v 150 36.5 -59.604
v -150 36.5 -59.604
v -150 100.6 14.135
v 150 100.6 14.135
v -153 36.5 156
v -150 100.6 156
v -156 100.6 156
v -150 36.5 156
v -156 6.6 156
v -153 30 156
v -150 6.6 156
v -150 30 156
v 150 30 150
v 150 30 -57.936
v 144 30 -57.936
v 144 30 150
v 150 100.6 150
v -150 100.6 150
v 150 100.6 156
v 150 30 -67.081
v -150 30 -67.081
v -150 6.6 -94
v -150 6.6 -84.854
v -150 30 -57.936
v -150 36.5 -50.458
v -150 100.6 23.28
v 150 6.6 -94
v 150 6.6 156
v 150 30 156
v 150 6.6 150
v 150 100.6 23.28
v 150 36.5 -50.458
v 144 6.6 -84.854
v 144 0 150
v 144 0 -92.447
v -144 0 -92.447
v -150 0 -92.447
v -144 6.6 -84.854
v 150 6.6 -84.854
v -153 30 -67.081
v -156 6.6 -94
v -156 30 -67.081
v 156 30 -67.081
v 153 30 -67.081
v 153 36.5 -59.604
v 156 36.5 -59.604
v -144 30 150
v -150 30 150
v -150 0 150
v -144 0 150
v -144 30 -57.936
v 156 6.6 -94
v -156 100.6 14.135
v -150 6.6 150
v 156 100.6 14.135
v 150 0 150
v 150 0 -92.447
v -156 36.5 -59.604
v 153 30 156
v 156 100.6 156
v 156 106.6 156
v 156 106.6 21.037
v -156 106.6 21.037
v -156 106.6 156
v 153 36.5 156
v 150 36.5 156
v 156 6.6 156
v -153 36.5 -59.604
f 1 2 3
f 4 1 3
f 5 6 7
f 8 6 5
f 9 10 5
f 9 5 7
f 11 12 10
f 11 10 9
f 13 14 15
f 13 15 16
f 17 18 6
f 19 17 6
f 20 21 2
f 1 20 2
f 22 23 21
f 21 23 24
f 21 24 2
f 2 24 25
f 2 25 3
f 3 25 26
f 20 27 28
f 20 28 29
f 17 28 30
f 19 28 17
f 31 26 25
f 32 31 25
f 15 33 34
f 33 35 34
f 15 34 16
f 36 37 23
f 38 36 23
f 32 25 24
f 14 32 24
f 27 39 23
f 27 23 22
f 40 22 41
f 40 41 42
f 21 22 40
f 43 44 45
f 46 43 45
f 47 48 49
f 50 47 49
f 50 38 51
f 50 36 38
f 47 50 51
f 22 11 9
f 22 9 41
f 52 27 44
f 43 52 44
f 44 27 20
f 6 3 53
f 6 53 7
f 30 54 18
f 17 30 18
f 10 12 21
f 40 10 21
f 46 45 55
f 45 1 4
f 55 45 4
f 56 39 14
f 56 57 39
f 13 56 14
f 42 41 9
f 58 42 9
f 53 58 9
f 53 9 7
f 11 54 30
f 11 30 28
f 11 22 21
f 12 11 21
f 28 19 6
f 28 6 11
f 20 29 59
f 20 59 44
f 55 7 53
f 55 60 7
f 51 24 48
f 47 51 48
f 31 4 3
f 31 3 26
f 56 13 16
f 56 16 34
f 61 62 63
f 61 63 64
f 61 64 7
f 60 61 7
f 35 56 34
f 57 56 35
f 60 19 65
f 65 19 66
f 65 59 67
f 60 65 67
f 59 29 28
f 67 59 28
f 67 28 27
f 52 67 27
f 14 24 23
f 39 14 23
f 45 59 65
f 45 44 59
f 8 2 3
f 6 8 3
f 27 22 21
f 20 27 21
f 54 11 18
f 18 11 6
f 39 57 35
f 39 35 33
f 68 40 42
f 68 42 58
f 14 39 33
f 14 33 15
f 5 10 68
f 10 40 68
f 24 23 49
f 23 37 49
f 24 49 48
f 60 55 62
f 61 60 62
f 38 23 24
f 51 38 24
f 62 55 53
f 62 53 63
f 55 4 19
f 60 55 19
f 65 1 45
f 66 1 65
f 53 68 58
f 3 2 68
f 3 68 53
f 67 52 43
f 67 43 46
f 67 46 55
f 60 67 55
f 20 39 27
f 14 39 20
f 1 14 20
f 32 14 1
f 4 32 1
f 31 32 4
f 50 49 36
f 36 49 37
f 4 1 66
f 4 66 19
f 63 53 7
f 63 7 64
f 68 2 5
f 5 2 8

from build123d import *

# Parameters (mm, degrees)
F2_W          = 64.1
F2_H          = 6
F2_W_2        = 23.4
F2_W_3        = 6.5
F3_DEPTH      = 6
F4_DEPTH      = 3
F2_W_4        = 6.6
F5_DEPTH      = 6
F7_DEPTH      = 306
F7_DEPTH_BACK = 6
F8_DEPTH      = 300


with BuildPart() as f3:
    # F2 (on plane+point) → F3 (new body)
    with BuildSketch(Plane.YZ.offset(-150)):
        with Locations((68.55, 153)):
            Rectangle(F2_W, F2_H)
        Polygon((100.6, 150), (36.5, 150), (36.5, -50.4584661039), (100.6, 23.280148799), align=None)
        Polygon((100.6, 23.280148799), (36.5, -50.4584661039), (36.5, -59.6039846241), (100.6, 14.1346302788), align=None)
        with Locations((18.3, 153)):
            Rectangle(F2_W_2, F2_H)
        Polygon((36.5, 150), (30, 150), (30, 144), (30, -48.7903422306), (30, -57.9358607508), (36.5, -50.4584661039), align=None)
        with Locations((33.25, 153)):
            Rectangle(F2_W_3, F2_H)
        Polygon((36.5, -59.6039846241), (36.5, -50.4584661039), (30, -57.9358607508), (30, -67.081379271), align=None)
        Polygon((30, -57.9358607508), (6.6, -84.8544814798), (6.6, -92.4469129674), (6.6, -94), (30, -67.081379271), align=None)
        Polygon((30, 144), (6.6, 144), (6.6, -75.7089629595), (30, -48.7903422306), align=None)
        with Locations((18.3, 147)):
            Rectangle(F2_W_2, F2_H)
        Polygon((30, -48.7903422306), (6.6, -75.7089629595), (6.6, -84.8544814798), (30, -57.9358607508), align=None)
    extrude(amount=-F3_DEPTH)

    # F2 (on plane+point) → F4 (cut)
    with BuildSketch(Plane.YZ.offset(-150)):
        Polygon((36.5, 150), (30, 150), (30, 144), (30, -48.7903422306), (30, -57.9358607508), (36.5, -50.4584661039), align=None)
        with Locations((33.25, 153)):
            Rectangle(F2_W_3, F2_H)
        Polygon((36.5, -59.6039846241), (36.5, -50.4584661039), (30, -57.9358607508), (30, -67.081379271), align=None)
    extrude(amount=-F4_DEPTH, mode=Mode.SUBTRACT)


with BuildPart() as f5:
    # F2 (on plane+point) → F5 (new body)
    with BuildSketch(Plane.YZ.offset(-150)):
        Polygon((6.6, 144), (0, 144), (0, -83.3013944472), (6.6, -75.7089629595), align=None)
        with Locations((3.3, 147)):
            Rectangle(F2_W_4, F2_H)
        with Locations((18.3, 147)):
            Rectangle(F2_W_2, F2_H)
        Polygon((30, 144), (6.6, 144), (6.6, -75.7089629595), (30, -48.7903422306), align=None)
        Polygon((30, -48.7903422306), (6.6, -75.7089629595), (6.6, -84.8544814798), (30, -57.9358607508), align=None)
        Polygon((6.6, -75.7089629595), (0, -83.3013944472), (0, -92.4469129674), (6.6, -84.8544814798), align=None)
    extrude(amount=F5_DEPTH)


with BuildPart() as f6_1:
    # F6: instance of F3
    add(f3.part.mirror(Plane.YZ))


with BuildPart() as f6_2:
    # F6: instance of F5
    add(f5.part.mirror(Plane.YZ))


with BuildPart() as f7:
    # F2 (on plane+point) → F7 (new body, two sides)
    with BuildSketch(Plane.YZ.offset(-150)) as f7_sk:
        Polygon((100.6, 156), (100.6, 150), (100.6, 23.280148799), (100.6, 14.1346302788), (106.6, 21.0368407221), (106.6, 156), align=None)
    extrude(amount=F7_DEPTH)
    extrude(f7_sk.sketch, amount=-F7_DEPTH_BACK)


with BuildPart() as f8:
    # F2 (on plane+point) → F8 (new body, through all)
    with BuildSketch(Plane.YZ.offset(-150)):
        Polygon((100.6, 23.280148799), (36.5, -50.4584661039), (36.5, -59.6039846241), (100.6, 14.1346302788), align=None)
        Polygon((36.5, -59.6039846241), (36.5, -50.4584661039), (30, -57.9358607508), (30, -67.081379271), align=None)
        Polygon((30, -57.9358607508), (6.6, -84.8544814798), (6.6, -92.4469129674), (6.6, -94), (30, -67.081379271), align=None)
    extrude(amount=F8_DEPTH)


with BuildPart() as f8b:
    # F2 (on plane+point) → F8, piece 2 (new body, through all)
    with BuildSketch(Plane.YZ.offset(-150)):
        with Locations((18.3, 153)):
            Rectangle(F2_W_2, F2_H)
        with Locations((33.25, 153)):
            Rectangle(F2_W_3, F2_H)
        with Locations((68.55, 153)):
            Rectangle(F2_W, F2_H)
    extrude(amount=F8_DEPTH)


solid = Compound([f3.part, f5.part, f6_1.part, f6_2.part, f7.part, f8.part, f8b.part])
